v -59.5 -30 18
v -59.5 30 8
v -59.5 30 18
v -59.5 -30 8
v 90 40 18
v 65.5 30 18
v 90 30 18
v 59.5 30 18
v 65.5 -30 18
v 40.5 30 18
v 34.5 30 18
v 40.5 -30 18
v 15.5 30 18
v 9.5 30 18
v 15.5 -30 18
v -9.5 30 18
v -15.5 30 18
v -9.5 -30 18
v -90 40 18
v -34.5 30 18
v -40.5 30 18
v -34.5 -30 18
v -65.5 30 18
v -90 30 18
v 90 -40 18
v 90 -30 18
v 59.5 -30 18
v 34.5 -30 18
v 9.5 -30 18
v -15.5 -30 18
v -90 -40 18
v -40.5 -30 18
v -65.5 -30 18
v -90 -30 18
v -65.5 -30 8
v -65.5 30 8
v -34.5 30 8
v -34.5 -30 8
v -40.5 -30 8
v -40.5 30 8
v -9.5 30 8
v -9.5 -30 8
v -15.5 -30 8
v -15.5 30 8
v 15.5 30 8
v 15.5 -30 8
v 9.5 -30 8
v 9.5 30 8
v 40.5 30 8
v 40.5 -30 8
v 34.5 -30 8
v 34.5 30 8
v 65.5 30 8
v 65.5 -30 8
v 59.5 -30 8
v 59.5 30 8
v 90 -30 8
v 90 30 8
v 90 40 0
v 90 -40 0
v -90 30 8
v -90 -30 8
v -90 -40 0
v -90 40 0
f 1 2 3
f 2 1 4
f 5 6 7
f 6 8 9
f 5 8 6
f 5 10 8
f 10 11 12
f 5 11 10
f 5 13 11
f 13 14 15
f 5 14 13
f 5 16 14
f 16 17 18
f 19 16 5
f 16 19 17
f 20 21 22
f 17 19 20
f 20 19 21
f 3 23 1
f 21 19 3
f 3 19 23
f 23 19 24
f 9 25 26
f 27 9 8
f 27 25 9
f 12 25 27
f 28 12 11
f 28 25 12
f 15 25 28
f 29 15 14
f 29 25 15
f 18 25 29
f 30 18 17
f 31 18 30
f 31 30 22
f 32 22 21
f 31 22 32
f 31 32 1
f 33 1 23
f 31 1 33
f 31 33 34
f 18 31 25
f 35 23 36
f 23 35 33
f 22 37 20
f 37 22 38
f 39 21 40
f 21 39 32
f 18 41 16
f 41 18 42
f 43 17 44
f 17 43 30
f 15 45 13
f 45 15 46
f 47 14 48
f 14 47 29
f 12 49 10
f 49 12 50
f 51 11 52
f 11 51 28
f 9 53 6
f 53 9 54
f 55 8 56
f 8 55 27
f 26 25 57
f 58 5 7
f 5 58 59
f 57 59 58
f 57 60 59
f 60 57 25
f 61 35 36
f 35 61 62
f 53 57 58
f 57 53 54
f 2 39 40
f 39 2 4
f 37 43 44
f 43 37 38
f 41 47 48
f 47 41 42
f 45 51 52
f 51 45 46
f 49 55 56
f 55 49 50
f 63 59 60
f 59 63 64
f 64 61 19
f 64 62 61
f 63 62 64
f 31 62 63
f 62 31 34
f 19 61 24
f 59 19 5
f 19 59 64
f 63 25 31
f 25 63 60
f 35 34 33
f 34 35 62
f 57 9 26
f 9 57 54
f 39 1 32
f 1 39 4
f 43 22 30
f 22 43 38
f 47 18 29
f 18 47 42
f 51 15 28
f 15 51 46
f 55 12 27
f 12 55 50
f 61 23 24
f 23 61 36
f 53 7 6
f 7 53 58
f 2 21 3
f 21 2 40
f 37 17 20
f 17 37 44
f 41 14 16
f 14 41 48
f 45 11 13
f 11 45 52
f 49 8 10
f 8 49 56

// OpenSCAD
$fn = 32;

// ----------------------------------------------------------------------
// Rib frame 180 x 80 x 18
// 6 ribs at 25 mm pitch
// ----------------------------------------------------------------------

// --- parameters (mm) ---
frame = [180, 80, 8];  // base plate size (x, y, z)
rail_w = 10;           // side rail width
ribs = 6;              // number of ribs
rib_t = 6;             // rib thickness
rib_h = 10;            // rib height above the base plate
pitch = 25;            // pitch between rib centres

// --- derived feature positions (mm) ---
span = (ribs - 1) * pitch;          // = 125   distance between the outer ribs
origin_x = -span / 2;               // = -62.5   X of the first rib
rib_len = frame[1] - 2 * rail_w + 2;  // = 62   rib length, 1 mm into each rail
feature_centers = [
  [origin_x + 0 * pitch, 0],
  [origin_x + 1 * pitch, 0],
  [origin_x + 2 * pitch, 0],
  [origin_x + 3 * pitch, 0],
  [origin_x + 4 * pitch, 0],
  [origin_x + 5 * pitch, 0]
];   // rib centre line, drives the rib loop

// base plate, two side rails, then the ribs read straight off feature_centers
union() {
  translate([-frame[0] / 2, -frame[1] / 2, 0]) cube(frame);
  translate([-frame[0] / 2, -frame[1] / 2, 0]) cube([frame[0], rail_w, frame[2] + rib_h]);
  translate([-frame[0] / 2, frame[1] / 2 - rail_w, 0]) cube([frame[0], rail_w, frame[2] + rib_h]);
  for (centre = feature_centers)
    translate([centre[0] - rib_t / 2, centre[1] - rib_len / 2, frame[2] - 1])
      cube([rib_t, rib_len, rib_h + 1]);
}
